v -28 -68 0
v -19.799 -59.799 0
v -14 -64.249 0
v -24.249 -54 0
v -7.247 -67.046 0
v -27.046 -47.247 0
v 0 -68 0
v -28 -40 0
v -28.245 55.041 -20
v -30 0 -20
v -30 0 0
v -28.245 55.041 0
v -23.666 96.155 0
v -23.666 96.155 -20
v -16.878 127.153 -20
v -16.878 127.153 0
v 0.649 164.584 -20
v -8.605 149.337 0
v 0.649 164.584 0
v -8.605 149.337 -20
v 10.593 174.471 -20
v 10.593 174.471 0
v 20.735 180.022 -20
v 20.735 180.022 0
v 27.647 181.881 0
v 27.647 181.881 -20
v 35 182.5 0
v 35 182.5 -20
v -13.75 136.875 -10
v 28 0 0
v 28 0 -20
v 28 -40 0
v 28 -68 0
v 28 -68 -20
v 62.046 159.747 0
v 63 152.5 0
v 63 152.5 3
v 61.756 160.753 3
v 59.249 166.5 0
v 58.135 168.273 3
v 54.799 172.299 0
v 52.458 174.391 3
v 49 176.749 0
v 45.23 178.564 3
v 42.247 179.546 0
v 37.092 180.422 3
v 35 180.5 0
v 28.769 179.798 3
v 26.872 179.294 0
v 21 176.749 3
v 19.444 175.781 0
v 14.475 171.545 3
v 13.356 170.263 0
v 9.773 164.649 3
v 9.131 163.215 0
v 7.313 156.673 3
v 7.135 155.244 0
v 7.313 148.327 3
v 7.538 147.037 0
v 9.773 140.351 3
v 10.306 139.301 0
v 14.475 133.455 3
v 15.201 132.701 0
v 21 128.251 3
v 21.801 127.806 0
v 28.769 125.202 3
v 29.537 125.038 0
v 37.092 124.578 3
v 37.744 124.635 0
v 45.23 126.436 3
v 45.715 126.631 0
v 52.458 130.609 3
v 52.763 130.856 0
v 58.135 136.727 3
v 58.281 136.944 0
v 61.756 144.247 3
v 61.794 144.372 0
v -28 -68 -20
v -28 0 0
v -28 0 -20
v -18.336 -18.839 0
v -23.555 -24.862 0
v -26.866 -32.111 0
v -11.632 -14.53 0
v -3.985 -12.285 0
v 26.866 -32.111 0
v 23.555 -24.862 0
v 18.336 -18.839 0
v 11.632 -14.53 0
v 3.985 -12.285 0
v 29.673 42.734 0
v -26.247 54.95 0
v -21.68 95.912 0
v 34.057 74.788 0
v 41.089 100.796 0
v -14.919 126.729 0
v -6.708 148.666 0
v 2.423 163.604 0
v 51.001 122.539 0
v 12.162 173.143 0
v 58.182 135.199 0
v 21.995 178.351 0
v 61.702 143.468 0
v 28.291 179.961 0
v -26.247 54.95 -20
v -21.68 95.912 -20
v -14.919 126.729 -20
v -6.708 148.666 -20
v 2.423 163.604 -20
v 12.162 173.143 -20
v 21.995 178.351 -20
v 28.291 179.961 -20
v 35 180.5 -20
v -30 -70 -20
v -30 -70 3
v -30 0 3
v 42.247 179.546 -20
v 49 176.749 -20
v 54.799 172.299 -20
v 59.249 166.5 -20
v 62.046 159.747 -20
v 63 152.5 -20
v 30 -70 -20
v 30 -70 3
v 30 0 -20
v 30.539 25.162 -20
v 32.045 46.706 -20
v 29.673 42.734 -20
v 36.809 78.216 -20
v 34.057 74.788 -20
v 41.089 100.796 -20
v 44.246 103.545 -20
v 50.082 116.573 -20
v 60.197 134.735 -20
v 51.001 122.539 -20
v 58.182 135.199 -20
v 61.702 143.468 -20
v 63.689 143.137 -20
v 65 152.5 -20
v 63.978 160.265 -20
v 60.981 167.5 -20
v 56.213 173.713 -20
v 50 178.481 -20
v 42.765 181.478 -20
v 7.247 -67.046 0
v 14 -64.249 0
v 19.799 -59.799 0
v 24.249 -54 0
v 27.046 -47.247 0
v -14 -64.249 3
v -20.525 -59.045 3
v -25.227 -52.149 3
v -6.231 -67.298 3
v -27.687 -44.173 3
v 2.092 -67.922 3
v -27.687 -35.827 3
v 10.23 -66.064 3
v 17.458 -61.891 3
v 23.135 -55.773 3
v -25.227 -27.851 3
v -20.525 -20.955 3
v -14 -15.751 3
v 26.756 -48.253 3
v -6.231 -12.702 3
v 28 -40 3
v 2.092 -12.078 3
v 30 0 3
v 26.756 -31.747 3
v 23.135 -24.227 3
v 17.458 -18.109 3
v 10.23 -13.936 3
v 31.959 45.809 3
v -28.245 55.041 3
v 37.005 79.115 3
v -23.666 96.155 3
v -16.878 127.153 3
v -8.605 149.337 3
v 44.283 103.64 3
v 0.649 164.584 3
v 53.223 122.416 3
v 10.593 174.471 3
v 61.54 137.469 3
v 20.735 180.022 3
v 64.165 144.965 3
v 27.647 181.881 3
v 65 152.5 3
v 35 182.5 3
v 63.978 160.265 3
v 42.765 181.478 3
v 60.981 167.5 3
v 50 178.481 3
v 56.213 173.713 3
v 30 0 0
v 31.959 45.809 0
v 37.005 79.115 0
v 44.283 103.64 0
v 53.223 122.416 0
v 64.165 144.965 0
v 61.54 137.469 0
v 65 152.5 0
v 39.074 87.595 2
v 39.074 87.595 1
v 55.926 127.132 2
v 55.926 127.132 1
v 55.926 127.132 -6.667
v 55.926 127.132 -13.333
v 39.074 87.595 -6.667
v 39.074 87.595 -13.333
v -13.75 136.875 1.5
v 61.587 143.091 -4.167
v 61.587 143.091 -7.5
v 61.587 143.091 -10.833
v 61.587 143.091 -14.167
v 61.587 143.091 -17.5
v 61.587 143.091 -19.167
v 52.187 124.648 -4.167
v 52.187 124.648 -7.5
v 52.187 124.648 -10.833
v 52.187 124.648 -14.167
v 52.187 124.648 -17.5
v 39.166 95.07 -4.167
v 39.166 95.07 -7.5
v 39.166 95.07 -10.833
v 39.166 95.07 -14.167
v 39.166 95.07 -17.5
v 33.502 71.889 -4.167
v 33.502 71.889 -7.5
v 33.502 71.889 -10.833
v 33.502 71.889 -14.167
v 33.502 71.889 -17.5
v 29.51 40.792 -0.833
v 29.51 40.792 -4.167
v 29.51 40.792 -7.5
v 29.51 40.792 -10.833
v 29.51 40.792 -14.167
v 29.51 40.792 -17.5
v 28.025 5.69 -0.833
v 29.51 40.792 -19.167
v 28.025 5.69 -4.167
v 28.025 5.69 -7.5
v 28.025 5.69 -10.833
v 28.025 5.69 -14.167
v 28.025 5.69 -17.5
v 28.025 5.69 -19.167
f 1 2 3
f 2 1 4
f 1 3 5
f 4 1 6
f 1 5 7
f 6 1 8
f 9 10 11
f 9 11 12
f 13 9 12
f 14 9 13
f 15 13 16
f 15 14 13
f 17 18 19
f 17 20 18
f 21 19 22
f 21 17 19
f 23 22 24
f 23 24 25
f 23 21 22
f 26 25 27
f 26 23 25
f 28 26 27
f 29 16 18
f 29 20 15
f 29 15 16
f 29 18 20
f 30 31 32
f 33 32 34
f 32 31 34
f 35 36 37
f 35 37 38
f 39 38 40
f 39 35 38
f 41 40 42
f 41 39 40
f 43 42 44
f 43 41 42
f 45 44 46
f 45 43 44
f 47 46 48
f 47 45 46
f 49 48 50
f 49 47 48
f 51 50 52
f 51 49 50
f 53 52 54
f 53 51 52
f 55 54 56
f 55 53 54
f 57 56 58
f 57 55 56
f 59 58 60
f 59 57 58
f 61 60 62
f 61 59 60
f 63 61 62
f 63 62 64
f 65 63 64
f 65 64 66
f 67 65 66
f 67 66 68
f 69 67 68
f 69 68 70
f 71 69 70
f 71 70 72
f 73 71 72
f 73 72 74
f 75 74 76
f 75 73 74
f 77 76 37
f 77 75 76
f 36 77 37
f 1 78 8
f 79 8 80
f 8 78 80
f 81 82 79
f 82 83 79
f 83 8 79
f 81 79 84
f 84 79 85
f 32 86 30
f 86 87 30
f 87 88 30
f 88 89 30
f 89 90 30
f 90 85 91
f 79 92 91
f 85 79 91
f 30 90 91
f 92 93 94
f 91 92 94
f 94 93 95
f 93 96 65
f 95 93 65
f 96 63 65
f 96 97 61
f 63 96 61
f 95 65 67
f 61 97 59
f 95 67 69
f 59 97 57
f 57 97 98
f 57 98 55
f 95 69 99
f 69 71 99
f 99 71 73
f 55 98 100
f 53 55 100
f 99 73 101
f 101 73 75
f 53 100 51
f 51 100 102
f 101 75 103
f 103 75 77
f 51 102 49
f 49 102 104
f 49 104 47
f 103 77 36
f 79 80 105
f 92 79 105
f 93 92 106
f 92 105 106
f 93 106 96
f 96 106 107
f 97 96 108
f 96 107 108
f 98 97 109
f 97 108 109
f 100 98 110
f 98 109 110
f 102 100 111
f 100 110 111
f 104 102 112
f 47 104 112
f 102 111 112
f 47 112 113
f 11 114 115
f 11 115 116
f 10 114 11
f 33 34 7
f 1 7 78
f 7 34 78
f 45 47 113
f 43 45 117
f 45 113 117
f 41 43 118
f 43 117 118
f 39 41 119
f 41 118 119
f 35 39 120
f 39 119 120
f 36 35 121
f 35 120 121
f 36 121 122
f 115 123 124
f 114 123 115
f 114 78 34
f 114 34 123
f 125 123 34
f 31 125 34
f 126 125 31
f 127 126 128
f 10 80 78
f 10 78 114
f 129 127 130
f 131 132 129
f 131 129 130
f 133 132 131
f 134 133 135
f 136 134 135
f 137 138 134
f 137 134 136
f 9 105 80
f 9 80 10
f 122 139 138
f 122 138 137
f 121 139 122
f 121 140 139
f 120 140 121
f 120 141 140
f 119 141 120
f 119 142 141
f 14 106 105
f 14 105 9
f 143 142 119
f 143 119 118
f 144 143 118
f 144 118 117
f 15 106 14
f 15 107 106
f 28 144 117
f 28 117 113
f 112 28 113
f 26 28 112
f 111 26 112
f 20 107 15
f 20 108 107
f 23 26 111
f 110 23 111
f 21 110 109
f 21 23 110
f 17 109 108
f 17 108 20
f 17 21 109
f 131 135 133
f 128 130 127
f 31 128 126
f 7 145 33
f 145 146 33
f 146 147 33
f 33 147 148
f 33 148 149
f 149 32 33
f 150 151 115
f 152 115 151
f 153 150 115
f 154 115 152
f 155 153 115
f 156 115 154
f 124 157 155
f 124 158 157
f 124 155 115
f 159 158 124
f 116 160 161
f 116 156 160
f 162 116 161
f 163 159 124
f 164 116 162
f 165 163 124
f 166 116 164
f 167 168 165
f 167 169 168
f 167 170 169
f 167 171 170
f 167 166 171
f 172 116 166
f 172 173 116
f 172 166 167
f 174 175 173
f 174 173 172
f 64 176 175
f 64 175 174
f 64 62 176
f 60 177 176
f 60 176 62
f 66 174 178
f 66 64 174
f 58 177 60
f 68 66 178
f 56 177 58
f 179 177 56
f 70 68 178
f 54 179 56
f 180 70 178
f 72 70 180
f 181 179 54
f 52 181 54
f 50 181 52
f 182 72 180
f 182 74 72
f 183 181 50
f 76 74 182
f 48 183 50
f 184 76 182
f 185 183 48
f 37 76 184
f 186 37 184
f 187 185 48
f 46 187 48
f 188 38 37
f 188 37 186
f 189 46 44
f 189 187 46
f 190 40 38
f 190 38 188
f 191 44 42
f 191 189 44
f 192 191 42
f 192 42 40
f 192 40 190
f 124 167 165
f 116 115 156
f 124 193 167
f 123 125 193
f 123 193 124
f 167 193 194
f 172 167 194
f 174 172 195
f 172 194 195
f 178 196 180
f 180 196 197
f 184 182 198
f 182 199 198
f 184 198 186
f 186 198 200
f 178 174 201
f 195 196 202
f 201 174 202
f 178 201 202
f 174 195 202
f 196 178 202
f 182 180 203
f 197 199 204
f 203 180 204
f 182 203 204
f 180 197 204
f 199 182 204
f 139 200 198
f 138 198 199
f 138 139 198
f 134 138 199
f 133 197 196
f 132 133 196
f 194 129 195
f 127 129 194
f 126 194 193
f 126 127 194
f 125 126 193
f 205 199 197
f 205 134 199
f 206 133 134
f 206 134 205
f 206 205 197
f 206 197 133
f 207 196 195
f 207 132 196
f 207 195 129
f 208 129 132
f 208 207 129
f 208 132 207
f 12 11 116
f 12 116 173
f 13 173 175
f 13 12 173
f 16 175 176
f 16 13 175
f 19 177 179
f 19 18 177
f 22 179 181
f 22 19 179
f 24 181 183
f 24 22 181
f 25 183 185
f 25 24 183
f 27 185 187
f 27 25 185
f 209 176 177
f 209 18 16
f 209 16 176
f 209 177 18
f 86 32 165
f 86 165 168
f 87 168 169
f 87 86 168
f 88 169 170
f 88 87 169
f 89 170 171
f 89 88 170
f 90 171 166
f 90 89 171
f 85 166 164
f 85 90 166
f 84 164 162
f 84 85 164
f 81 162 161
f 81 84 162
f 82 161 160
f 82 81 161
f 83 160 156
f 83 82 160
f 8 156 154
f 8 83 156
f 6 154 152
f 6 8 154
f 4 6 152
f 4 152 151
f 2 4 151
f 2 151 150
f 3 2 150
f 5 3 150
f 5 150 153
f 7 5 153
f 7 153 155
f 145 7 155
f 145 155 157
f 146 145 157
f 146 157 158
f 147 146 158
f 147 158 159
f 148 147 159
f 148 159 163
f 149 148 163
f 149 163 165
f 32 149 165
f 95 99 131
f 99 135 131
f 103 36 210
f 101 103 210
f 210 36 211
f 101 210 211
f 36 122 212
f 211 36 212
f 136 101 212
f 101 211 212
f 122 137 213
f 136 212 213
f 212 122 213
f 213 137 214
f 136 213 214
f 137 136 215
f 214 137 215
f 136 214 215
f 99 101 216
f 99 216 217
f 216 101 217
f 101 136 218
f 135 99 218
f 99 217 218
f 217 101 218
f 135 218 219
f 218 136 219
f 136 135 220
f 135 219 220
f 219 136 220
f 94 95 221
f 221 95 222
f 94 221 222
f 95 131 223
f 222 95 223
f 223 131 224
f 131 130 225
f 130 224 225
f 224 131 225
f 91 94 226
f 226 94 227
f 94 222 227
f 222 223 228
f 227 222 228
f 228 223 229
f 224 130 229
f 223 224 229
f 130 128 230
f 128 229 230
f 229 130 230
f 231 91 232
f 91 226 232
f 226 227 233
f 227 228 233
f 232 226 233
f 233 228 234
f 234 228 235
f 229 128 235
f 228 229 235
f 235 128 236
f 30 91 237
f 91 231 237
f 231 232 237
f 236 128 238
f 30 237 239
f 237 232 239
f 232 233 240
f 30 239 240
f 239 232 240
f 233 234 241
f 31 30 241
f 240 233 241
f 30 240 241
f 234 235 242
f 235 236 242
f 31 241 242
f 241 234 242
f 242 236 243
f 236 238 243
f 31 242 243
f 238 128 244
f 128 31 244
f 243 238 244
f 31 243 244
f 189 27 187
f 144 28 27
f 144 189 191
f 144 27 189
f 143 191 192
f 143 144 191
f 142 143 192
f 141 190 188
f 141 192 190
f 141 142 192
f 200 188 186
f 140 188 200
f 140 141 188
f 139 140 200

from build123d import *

# Parameters (mm, degrees)
BOSS_EXTRUDE1_OUTLINE_R = 28
BOSS_EXTRUDE1_DEPTH     = 3
BOSS_EXTRUDE3_START     = 20
BOSS_EXTRUDE3_DEPTH     = 20


# Read off the part's stored shape, not the designer's step: Boss-Extrude1
with BuildPart() as part:
    # Boss-Extrude1 outline → Boss-Extrude1 (new body)
    with BuildSketch(Plane.XY):
        with BuildLine():
            Line((30, -70), (30, 0))
            add(Edge.make_bspline(
                [(30, 0), (30, 122.919601085), (65, 122.919601085), (65, 152.5)],
                knots=[0, 0, 0, 0, 1, 1, 1, 1], degree=3))
            ThreePointArc((65, 152.5), (56.213203436, 173.713203436), (35, 182.5))
            add(Edge.make_bspline(
                [(-30, 0), (-30, 182.5), (35, 182.5)],
                knots=[0, 0, 0, 1, 1, 1], degree=2))
            Line((-30, 0), (-30, -70))
            Line((-30, -70), (30, -70))
        make_face()
        with Locations((0, -40)):
            Circle(BOSS_EXTRUDE1_OUTLINE_R, mode=Mode.SUBTRACT)
        with Locations((35, 152.5)):
            Circle(BOSS_EXTRUDE1_OUTLINE_R, mode=Mode.SUBTRACT)
    extrude(amount=BOSS_EXTRUDE1_DEPTH)

    # Sketch3 → Boss-Extrude3 (add)
    with BuildSketch(Plane(origin=(0, 0, 0), x_dir=(-1, 0, 0), z_dir=(0, 0, -1)).offset(BOSS_EXTRUDE3_START)):
        with BuildLine():
            Line((-30, 0), (-30, -70))
            Line((-30, -70), (30, -70))
            Line((30, -70), (30, 0))
            add(Edge.make_bspline(
                [(30, 0), (30, 182.5), (-35, 182.5)],
                knots=[0, 0, 0, 1, 1, 1], degree=2))
            ThreePointArc((-35, 182.5), (-56.213203436, 173.713203436), (-65, 152.5))
            add(Edge.make_bspline(
                [(-65, 152.5), (-65, 122.919601085), (-30, 122.919601085), (-30, 0)],
                knots=[0, 0, 0, 0, 1, 1, 1, 1], degree=3))
        make_face()
        with BuildLine():
            Line((-28, 0), (-28, -68))
            Line((-28, -68), (28, -68))
            Line((28, -68), (28, 0))
            add(Edge.make_bspline(
                [(28, 0), (28, 1.882428306), (27.9894412, 5.668914661), (27.926096555, 13.06867177), (27.76775639, 22.113138456), (27.45115367, 32.600472774), (26.860323994, 46.108658024), (25.805698034, 62.096829622), (24.035349894, 79.847577378), (21.76158749, 96.16063855), (18.061595292, 115.991158762), (12.190733374, 137.171036702), (3.196896645, 156.784444582), (-5.834661566, 168.281935437), (-13.924397363, 174.636152769), (-19.34693601, 177.454327423), (-23.921129202, 179.03154511), (-27.474819646, 179.877405657), (-30.546503211, 180.301515997), (-33.065469046, 180.471580895), (-34.357731157, 180.5), (-35, 180.5)],
                knots=[0.49382409, 0.49382409, 0.49382409, 0.49382409, 0.49393283, 0.494041569, 0.494259049, 0.494476528, 0.494694008, 0.495128967, 0.495563926, 0.495998885, 0.496433844, 0.497303761, 0.498173679, 0.499043597, 0.499478556, 0.499913515, 0.500130995, 0.500348474, 0.500565954, 0.500674693, 0.500783433, 0.500783433, 0.500783433, 0.500783433], degree=3))
            ThreePointArc((-35, 180.5), (-54.798989873, 172.298989873), (-63, 152.5))
            add(Edge.make_bspline(
                [(-63, 152.5), (-63, 152.069757812), (-62.983825045, 151.199286285), (-62.88918488, 149.540019878), (-62.658452593, 147.549741818), (-62.213886299, 145.2784002), (-61.410812146, 142.352354087), (-60.033210568, 138.80365362), (-57.846222702, 134.475175879), (-55.208976195, 129.863823008), (-51.231452034, 123.063969133), (-46.792456906, 114.875371889), (-42.352360132, 104.461715313), (-39.130632465, 95.326409045), (-36.123020534, 84.651250359), (-33.432349584, 72.218369024), (-31.538773259, 60.209244421), (-30.283559802, 49.501788472), (-29.484585221, 40.893227078), (-28.840668199, 31.678686061), (-28.443815603, 23.471810433), (-28.216507678, 16.574966065), (-28.092697498, 11.23438398), (-28.029735078, 6.636857178), (-28.004285655, 2.878237886), (-28, 0.955822894), (-28, 0)],
                knots=[0, 0, 0, 0, 0.015625, 0.03125, 0.0625, 0.09375, 0.125, 0.1875, 0.25, 0.3125, 0.375, 0.5, 0.5625, 0.625, 0.6875, 0.75, 0.8125, 0.84375, 0.875, 0.90625, 0.9375, 0.953125, 0.96875, 0.984375, 0.9921875, 1, 1, 1, 1], degree=3))
        make_face(mode=Mode.SUBTRACT)
    extrude(amount=-BOSS_EXTRUDE3_DEPTH)


solid = part.part
